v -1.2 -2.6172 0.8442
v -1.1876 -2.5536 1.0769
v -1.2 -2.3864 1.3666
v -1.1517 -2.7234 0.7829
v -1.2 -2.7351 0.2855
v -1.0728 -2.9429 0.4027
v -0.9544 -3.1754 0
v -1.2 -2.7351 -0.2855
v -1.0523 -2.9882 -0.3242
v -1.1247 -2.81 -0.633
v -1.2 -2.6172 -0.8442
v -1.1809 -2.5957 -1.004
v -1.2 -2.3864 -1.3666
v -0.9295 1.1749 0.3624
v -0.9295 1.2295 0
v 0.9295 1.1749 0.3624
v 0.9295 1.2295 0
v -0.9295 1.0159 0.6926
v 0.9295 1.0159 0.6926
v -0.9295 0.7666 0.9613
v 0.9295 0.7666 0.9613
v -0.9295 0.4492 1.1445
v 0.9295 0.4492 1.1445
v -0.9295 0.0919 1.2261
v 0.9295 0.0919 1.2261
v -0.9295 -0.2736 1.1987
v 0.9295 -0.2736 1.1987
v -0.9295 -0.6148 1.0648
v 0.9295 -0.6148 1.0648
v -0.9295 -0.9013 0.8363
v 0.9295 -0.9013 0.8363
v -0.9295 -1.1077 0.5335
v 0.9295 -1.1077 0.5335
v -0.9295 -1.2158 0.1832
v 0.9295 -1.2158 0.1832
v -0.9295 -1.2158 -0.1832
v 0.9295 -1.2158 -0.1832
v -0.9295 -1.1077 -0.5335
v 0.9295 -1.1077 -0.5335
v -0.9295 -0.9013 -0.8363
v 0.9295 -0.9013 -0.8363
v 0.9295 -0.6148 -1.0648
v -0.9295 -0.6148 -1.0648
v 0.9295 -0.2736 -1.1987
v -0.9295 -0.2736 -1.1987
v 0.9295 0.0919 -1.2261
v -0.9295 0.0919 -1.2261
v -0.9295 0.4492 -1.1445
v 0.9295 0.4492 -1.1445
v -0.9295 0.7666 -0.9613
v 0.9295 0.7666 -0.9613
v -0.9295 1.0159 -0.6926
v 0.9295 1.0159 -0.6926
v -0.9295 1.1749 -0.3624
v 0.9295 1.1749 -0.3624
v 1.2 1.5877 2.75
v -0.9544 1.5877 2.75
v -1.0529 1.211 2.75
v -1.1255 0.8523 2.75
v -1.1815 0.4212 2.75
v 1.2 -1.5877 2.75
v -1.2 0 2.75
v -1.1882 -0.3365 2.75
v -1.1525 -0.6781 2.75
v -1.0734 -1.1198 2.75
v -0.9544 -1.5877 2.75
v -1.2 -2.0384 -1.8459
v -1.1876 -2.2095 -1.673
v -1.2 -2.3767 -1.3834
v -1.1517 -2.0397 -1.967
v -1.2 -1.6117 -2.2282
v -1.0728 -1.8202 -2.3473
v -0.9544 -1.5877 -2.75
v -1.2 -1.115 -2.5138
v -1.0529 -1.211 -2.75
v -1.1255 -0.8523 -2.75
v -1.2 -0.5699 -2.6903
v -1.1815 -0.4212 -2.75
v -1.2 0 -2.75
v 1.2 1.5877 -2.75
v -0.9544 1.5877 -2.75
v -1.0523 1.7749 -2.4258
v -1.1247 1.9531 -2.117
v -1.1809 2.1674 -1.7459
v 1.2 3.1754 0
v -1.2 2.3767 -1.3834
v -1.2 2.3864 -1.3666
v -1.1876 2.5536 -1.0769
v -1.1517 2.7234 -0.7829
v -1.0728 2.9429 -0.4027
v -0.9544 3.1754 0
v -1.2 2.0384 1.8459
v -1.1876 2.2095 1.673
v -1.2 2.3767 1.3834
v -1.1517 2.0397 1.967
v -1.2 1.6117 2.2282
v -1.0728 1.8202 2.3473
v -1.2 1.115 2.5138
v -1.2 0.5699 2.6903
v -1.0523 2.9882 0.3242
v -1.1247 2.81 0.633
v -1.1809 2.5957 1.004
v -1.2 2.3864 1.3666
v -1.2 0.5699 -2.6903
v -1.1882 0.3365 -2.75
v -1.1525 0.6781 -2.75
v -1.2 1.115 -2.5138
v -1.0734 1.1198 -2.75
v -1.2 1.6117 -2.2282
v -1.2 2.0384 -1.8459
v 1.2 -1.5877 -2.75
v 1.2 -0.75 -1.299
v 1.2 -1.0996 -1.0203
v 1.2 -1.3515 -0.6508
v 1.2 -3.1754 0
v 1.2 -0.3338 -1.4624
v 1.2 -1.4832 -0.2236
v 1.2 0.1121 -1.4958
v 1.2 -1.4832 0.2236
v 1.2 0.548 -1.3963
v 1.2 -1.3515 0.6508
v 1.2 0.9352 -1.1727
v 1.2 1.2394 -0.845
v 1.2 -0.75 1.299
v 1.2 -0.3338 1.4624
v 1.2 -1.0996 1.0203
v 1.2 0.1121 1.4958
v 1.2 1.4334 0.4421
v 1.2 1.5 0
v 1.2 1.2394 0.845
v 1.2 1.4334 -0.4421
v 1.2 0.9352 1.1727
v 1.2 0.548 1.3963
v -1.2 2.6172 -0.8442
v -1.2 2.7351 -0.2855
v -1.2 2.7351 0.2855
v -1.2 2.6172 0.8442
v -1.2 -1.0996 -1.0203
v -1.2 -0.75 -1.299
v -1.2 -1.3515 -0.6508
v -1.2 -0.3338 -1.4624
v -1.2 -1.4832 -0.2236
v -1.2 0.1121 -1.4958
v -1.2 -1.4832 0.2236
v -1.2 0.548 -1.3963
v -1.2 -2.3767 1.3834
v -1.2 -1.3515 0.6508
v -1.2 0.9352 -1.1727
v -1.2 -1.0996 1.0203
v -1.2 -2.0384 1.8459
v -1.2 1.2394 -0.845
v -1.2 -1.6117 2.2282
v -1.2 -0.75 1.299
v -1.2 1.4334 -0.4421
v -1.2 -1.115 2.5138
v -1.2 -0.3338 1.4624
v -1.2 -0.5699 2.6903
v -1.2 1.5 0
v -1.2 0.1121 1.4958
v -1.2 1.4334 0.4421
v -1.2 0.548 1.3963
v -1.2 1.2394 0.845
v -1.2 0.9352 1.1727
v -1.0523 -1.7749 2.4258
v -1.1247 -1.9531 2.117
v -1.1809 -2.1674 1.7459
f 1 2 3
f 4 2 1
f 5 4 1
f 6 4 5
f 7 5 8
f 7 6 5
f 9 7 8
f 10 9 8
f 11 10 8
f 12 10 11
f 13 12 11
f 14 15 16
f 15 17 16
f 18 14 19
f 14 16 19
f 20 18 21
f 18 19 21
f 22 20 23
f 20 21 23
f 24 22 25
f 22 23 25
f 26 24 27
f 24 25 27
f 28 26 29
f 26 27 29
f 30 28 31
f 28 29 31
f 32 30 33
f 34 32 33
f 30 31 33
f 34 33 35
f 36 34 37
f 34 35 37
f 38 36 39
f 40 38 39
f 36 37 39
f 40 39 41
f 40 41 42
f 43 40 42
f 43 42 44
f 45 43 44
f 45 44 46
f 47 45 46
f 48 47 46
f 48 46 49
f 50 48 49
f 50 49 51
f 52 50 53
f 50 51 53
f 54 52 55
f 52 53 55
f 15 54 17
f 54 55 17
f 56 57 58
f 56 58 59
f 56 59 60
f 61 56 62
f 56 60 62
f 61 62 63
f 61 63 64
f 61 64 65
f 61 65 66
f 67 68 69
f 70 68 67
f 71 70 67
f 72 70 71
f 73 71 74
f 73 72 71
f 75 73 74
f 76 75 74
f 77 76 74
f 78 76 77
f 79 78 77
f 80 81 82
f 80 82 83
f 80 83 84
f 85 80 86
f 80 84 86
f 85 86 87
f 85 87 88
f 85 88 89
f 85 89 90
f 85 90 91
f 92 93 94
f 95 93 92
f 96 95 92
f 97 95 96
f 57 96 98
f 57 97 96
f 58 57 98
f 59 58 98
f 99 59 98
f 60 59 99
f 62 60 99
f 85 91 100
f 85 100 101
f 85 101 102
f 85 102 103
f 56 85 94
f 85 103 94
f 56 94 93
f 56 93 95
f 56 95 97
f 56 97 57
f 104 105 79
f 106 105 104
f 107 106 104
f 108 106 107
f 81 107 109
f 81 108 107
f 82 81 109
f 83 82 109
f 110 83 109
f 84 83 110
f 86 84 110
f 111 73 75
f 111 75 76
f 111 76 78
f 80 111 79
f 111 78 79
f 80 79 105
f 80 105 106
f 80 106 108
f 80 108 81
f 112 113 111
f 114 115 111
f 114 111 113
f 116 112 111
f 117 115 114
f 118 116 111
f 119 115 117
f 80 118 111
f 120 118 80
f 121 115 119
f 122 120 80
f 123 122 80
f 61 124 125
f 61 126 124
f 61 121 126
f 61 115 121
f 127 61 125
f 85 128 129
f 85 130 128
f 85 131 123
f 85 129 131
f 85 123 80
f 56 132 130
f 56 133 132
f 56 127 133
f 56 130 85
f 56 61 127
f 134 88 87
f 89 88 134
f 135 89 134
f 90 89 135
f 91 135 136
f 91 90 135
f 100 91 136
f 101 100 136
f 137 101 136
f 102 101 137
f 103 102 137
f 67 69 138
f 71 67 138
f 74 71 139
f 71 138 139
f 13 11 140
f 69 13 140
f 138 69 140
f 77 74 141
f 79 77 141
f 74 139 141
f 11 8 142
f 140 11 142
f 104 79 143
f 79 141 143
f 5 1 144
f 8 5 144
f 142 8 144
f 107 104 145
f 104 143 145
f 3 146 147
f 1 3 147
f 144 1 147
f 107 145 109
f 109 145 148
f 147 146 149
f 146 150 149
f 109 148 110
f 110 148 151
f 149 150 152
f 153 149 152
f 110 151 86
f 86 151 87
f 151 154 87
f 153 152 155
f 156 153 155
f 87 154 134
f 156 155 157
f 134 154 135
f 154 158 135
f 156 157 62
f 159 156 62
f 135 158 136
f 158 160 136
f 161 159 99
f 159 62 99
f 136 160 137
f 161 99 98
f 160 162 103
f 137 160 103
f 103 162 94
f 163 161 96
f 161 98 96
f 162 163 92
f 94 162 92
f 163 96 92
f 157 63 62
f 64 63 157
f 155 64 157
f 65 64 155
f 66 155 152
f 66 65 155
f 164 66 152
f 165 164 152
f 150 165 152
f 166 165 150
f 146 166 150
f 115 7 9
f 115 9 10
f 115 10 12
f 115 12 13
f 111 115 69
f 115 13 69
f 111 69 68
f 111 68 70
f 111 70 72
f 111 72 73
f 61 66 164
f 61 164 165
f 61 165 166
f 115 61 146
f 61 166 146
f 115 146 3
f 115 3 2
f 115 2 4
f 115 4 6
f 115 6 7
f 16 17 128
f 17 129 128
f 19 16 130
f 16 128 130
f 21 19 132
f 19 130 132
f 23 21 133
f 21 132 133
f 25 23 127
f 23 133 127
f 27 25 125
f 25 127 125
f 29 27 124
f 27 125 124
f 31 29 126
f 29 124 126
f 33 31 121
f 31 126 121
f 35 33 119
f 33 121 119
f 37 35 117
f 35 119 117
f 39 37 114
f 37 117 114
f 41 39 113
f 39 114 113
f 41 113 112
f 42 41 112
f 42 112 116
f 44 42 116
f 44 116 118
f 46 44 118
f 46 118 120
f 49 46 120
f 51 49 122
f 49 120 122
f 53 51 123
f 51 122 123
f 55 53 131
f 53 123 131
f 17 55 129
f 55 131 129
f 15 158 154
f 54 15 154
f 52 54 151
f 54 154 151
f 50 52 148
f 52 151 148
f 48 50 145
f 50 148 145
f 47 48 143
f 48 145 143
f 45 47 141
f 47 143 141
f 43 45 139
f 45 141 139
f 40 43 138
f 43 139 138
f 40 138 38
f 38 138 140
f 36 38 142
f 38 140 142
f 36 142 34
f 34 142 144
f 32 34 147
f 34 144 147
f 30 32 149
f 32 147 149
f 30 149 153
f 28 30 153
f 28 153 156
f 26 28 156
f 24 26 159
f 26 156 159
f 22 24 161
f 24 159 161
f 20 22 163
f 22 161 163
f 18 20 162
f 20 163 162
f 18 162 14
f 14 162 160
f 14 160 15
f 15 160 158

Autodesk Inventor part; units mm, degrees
sketch "Sketch_1" plane through (0, 0, 0) normal (0, 0, 1) x (1, 0, 0)
  line L0 (1.2, 0) -> (-1.2, 0)
  line L1 (-1.2, 0) -> (-1.2, 2.75)
  line L2 (-1.2, 2.75) -> (-0.9402, 3.2)
  line L3 (-0.9402, 3.2) -> (1.2, 3.2)
  line L4 (1.2, 3.2) -> (1.2, 0)
  line L5 (1.2, 0) -> (-1.2, 0)
revolve "Revolution1" add sketch "Sketch_1" angle 360 about axis through (1.2, 0, 0) along (1, 0, 0)
sketch "Sketch_2" plane through (0, 0, 0) normal (0, 0, 1) x (1, 0, 0)
  line L0 (1.2, 0) -> (-1.2, 0)
  line L1 (-1.2, 0) -> (-1.2, 1.5)
  line L2 (-1.2, 1.5) -> (-0.9295, 1.2295)
  line L3 (-0.9295, 1.2295) -> (0.9295, 1.2295)
  line L4 (0.9295, 1.2295) -> (1.2, 1.5)
  line L5 (1.2, 1.5) -> (1.2, 0)
  line L6 (1.2, 0) -> (-1.2, 0)
revolve "Revolution2" cut sketch "Sketch_2" angle 360 about axis through (1.2, 0, 0) along (1, 0, 0)
thread "Thread1" size "M3x0.5" class "6H" standard "ISO Metric profile" full length
sketch "Sketch_3" plane through (0, 0, 0) normal (1, 0, 0) x (0, 1, 0)
  line L0 (-5.5, 5.5) -> (-5.5, -5.5)
  line L1 (-5.5, -5.5) -> (5.5, -5.5)
  line L2 (5.5, -5.5) -> (5.5, 5.5)
  line L3 (5.5, 5.5) -> (-5.5, 5.5)
  line L4 (-1.5877, 2.75) -> (-3.1754, 0)
  line L5 (-3.1754, 0) -> (-1.5877, -2.75)
  line L6 (-1.5877, -2.75) -> (1.5877, -2.75)
  line L7 (1.5877, -2.75) -> (3.1754, 0)
  line L8 (3.1754, 0) -> (1.5877, 2.75)
  line L9 (1.5877, 2.75) -> (-1.5877, 2.75)
extrude "Extrusion1" cut sketch "Sketch_3" along normal mid plane 2.4
ref_plane "cp_XY" through (1.2, 0, 0) normal (1, 0, 0) x (0, 0, -1)
ref_plane "cp_YZ" through (1.2, 0, 0) normal (0, 0, -1) x (0, 1, 0)
ref_plane "cp_ZX" through (1.2, 0, 0) normal (0, 1, 0) x (1, 0, 0)
ref_plane "nut_to_screw_XY" through (0, 0, 0) normal (1, 0, 0) x (0, 0, -1)
ref_plane "nut_to_screw_YZ" through (0, 0, 0) normal (0, 0, -1) x (0, 1, 0)
ref_plane "nut_to_screw_ZX" through (0, 0, 0) normal (0, 1, 0) x (1, 0, 0)
properties part number "LBNR3" material "鋼、炭素鋼"
